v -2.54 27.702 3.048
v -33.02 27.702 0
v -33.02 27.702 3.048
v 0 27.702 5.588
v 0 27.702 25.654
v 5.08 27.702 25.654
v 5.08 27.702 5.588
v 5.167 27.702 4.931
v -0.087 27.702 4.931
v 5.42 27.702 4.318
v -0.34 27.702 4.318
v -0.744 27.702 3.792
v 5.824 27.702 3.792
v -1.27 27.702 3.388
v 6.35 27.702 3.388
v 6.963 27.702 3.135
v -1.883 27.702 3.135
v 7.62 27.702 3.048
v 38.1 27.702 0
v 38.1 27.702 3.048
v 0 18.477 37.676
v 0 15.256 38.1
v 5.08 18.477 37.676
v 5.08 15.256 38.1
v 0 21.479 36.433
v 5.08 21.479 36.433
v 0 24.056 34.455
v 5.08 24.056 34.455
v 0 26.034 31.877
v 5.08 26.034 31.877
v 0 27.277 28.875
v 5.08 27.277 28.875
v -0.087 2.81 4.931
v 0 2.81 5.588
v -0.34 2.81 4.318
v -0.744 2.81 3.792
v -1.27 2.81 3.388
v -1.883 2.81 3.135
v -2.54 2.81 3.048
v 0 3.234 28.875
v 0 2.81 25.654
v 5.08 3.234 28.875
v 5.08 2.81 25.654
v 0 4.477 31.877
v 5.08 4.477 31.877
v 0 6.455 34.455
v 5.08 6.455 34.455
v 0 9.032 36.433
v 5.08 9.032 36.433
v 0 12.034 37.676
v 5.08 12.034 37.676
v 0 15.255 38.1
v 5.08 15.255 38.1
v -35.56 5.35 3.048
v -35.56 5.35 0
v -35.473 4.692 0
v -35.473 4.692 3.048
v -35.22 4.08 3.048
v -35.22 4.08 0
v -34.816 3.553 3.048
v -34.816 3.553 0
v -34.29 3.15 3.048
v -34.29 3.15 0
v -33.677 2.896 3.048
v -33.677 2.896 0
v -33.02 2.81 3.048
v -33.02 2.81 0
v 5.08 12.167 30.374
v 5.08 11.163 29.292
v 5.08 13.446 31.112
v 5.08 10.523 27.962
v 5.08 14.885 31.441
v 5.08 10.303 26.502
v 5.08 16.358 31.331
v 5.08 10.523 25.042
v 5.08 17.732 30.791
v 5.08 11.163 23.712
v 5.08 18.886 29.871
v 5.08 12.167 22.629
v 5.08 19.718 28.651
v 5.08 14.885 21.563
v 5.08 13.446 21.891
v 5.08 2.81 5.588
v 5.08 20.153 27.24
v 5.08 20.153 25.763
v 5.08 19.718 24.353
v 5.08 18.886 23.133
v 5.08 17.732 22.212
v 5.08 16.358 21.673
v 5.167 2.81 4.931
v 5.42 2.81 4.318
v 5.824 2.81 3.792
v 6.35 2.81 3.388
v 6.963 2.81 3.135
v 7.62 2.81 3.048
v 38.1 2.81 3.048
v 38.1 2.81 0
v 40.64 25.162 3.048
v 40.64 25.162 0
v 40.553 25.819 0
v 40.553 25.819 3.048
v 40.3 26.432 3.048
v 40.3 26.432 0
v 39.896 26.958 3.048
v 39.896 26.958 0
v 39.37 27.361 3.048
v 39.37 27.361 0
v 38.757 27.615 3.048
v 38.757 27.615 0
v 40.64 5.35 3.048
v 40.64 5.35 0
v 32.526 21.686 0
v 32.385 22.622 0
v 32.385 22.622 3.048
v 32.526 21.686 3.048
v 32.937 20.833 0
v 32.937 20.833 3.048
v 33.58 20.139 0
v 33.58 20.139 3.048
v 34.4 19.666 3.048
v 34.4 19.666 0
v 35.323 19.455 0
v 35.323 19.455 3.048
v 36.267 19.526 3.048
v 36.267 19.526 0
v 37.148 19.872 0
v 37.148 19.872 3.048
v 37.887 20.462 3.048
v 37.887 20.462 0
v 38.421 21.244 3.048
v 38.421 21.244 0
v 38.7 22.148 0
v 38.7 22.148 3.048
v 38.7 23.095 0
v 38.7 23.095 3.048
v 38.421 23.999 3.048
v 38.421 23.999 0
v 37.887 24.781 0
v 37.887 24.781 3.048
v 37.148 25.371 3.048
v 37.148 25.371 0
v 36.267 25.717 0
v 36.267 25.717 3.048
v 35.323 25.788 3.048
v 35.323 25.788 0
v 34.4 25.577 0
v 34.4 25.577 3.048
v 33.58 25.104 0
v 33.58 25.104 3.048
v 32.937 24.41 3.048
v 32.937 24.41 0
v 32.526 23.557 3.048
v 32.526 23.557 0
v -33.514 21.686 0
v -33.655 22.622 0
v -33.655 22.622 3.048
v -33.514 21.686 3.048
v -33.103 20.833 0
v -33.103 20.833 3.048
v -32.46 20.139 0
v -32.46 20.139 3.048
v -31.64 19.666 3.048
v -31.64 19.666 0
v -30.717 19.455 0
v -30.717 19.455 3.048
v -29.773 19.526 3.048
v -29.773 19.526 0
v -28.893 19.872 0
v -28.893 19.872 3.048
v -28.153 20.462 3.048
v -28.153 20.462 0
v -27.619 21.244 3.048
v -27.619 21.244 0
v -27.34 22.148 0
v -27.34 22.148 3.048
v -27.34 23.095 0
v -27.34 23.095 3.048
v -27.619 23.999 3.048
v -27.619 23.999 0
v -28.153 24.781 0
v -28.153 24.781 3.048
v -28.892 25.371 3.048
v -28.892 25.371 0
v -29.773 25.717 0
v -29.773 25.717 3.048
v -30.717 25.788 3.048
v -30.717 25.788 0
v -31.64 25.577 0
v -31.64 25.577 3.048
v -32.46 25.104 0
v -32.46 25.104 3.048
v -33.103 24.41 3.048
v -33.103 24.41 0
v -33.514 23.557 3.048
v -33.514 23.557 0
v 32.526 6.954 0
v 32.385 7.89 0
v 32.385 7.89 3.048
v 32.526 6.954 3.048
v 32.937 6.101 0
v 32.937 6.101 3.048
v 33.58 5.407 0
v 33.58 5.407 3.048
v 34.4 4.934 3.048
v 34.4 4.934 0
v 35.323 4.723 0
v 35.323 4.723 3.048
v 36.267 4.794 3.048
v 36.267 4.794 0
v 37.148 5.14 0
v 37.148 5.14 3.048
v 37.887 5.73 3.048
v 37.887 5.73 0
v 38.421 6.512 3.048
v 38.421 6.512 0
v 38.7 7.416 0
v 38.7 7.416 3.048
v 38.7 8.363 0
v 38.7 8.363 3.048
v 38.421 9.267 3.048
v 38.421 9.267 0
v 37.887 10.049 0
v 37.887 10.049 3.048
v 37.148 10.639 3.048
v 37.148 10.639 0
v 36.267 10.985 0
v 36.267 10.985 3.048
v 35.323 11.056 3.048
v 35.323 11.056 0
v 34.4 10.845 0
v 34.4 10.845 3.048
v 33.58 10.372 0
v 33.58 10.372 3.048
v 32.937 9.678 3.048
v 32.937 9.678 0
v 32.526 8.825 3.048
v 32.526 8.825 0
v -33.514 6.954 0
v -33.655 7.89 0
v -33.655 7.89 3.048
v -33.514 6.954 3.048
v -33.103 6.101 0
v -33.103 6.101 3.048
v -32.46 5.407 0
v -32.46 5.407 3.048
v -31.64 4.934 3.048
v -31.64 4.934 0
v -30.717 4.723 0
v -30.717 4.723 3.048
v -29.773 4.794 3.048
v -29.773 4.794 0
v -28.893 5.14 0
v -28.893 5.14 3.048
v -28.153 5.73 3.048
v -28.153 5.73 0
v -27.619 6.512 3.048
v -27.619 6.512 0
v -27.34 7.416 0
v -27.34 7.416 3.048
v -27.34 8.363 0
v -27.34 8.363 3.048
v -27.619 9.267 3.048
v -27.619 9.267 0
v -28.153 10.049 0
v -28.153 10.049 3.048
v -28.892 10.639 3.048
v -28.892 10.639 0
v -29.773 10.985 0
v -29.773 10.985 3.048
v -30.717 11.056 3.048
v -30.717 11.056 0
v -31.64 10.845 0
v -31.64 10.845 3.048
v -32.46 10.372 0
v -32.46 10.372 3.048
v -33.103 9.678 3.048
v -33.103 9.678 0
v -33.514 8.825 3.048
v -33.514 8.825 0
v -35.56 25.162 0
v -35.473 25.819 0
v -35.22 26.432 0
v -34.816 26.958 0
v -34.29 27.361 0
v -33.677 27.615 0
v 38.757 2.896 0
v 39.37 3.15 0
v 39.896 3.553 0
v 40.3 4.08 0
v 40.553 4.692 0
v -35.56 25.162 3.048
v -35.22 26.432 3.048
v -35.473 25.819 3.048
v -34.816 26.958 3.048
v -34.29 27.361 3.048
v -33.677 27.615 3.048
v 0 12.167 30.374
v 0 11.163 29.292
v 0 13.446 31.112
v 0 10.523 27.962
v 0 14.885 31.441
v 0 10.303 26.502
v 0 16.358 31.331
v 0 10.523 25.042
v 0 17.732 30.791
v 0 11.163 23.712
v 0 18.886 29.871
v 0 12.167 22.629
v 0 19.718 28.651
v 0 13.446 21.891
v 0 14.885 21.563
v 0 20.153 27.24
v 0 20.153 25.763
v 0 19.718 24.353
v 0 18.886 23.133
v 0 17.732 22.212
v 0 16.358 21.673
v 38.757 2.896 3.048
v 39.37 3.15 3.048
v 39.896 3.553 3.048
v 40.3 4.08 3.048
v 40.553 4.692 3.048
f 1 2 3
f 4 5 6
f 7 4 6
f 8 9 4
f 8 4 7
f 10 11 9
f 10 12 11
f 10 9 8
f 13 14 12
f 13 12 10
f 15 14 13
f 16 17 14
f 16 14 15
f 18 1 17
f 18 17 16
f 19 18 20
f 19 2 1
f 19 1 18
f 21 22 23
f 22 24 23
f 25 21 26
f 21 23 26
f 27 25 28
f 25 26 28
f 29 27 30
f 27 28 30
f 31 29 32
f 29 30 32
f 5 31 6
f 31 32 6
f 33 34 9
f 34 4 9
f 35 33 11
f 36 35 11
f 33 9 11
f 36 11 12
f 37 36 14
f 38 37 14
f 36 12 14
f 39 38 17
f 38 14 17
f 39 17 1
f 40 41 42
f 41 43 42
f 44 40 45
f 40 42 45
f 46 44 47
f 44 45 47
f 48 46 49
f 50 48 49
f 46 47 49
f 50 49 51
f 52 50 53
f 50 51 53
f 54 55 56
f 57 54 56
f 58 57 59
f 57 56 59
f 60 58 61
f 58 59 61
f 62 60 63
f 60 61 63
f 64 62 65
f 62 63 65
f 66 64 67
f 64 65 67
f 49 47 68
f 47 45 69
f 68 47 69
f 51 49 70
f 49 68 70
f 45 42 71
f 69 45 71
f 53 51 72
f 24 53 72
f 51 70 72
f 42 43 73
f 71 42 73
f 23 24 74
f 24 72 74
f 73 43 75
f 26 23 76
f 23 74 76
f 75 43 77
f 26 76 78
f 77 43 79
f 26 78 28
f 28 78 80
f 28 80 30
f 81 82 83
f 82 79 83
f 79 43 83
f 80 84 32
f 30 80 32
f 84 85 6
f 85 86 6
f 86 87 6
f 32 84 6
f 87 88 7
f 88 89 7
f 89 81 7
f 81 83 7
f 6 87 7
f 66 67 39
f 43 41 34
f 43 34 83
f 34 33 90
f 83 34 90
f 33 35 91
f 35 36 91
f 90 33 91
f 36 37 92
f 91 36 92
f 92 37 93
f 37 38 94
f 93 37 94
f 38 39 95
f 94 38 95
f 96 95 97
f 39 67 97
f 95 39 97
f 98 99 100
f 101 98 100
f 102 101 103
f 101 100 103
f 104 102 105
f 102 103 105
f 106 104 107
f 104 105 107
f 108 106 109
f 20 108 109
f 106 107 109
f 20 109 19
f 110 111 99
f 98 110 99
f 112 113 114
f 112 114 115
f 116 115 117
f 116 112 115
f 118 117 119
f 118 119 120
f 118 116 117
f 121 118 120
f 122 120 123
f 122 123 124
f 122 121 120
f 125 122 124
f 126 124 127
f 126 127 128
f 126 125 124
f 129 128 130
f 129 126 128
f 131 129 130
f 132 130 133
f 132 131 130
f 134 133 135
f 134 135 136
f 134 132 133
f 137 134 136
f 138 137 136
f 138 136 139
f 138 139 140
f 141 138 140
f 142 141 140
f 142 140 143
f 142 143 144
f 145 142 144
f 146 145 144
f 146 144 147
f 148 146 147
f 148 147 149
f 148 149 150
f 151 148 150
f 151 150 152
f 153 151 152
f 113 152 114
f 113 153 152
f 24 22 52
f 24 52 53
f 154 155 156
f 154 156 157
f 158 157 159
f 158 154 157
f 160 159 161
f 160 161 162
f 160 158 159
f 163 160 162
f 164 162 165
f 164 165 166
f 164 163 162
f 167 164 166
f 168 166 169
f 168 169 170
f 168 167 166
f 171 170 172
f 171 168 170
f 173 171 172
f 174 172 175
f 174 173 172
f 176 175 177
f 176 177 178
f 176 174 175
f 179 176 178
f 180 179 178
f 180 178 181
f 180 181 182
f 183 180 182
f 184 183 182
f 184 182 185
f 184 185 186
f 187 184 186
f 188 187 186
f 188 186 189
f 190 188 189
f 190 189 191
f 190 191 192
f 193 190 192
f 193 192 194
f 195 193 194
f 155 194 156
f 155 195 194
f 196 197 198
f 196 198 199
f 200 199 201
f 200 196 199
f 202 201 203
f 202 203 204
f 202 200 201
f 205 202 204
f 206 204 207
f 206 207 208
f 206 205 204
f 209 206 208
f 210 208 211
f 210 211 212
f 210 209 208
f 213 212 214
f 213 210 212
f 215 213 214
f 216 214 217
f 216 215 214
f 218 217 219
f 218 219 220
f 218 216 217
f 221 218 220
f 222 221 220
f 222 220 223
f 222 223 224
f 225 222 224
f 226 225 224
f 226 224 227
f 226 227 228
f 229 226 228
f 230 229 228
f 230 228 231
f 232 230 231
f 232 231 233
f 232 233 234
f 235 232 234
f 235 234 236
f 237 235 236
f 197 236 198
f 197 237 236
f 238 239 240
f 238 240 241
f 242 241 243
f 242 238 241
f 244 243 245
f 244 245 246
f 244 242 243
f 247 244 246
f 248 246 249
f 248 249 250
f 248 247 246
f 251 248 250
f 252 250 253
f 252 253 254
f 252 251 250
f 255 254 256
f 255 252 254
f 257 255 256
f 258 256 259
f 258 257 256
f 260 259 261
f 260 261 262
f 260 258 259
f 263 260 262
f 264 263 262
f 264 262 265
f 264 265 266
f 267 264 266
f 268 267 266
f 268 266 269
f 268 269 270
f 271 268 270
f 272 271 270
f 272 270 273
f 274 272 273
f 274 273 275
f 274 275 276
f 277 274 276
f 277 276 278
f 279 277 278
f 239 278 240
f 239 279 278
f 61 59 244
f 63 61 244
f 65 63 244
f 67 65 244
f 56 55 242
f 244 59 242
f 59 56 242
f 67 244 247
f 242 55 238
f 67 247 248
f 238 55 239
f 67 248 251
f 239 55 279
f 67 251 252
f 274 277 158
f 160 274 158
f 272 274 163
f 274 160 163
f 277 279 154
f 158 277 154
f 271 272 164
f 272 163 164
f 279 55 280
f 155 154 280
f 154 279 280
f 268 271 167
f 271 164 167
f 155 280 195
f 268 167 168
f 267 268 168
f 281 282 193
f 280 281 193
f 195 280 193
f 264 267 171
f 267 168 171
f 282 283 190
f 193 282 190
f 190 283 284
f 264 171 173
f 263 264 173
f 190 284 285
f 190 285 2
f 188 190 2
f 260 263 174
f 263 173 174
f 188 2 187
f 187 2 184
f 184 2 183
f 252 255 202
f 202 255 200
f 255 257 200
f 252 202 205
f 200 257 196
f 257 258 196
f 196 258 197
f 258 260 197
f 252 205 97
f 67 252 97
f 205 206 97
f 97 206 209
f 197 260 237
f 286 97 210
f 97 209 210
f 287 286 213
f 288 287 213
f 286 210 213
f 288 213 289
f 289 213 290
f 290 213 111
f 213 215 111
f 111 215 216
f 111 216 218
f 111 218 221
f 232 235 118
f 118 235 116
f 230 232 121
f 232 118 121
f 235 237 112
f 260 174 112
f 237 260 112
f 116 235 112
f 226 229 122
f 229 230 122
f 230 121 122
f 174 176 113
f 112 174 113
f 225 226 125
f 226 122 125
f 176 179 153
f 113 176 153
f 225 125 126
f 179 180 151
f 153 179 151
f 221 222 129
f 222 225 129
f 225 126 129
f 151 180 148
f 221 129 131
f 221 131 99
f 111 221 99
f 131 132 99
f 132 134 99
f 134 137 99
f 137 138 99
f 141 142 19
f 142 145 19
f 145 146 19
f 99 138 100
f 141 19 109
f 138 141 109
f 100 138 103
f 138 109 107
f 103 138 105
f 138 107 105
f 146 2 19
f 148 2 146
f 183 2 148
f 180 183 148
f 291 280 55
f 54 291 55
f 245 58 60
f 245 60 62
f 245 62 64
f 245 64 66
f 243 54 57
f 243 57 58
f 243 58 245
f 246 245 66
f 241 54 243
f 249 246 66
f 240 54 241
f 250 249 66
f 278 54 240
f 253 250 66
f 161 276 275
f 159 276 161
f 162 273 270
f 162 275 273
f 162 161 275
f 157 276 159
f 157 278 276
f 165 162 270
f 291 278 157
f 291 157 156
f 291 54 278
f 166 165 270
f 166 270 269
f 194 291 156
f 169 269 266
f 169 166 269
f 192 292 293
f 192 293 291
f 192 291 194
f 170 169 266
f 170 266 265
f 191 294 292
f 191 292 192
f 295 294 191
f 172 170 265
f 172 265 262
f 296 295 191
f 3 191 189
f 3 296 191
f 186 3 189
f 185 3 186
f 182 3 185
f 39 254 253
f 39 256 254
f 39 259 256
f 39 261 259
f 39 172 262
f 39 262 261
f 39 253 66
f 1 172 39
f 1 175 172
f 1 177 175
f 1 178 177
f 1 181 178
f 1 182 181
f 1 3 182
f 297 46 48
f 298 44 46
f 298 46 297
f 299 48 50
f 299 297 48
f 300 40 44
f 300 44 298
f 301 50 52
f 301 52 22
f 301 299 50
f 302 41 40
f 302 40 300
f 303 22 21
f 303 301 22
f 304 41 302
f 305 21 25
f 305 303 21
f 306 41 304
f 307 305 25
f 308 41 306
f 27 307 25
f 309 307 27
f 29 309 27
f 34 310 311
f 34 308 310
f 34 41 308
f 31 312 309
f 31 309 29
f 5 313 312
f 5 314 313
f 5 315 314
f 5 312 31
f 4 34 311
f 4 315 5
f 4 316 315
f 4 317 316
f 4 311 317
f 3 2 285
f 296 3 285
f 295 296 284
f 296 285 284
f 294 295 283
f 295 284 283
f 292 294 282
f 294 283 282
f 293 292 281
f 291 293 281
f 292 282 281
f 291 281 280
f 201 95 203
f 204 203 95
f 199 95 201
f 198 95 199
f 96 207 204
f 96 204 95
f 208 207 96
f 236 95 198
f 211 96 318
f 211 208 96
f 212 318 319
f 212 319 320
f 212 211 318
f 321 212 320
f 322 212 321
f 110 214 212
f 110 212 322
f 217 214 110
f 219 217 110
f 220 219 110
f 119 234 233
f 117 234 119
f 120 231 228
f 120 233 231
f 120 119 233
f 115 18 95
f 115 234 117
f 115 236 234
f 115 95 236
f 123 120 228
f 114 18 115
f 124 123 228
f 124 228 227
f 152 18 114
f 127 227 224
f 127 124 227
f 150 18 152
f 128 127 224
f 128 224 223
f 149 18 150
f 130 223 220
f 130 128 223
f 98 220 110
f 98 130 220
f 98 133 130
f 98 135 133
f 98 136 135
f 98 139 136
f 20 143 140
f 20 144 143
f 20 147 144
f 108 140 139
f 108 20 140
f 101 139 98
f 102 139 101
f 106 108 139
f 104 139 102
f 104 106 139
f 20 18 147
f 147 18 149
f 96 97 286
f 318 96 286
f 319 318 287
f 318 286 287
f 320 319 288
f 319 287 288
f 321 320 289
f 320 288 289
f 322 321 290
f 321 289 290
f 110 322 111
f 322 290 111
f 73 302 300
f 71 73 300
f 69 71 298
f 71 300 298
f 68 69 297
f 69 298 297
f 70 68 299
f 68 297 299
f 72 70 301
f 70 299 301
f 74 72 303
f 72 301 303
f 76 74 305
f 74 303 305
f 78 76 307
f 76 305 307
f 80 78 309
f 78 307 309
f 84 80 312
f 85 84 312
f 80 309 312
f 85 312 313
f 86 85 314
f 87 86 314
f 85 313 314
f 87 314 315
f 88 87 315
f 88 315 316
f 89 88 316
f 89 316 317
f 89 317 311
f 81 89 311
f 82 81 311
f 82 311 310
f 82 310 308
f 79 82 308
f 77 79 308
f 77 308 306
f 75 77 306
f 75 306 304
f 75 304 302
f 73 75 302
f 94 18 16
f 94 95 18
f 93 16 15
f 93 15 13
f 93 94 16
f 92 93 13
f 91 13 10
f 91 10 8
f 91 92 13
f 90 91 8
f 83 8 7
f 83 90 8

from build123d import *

# Parameters (mm, degrees)
SKETCH1_R             = 3.175
BOSS_EXTRUDE9_DEPTH   = 3.048
BOSS_EXTRUDE9_2_DEPTH = 3.048
SKETCH1_17_W          = 5.08
SKETCH1_17_H          = 24.892
BOSS_EXTRUDE10_DEPTH  = 38.1
FILLET3_R             = 2.54
FILLET4_R             = 2.54
FILLET6_R             = 12.446
SKETCH2_R             = 4.953
CUT_EXTRUDE1_DEPTH    = 38.1


with BuildPart() as part:
    # Sketch1 → Boss-Extrude9 (new body)
    with BuildSketch(Plane.XY):
        with BuildLine():
            Line((0, 2.809544612), (0, 27.701544612))
            Line((0, 27.701544612), (-33.02, 27.701544612))
            ThreePointArc((-33.02, 27.701544612), (-34.816051224, 26.957595836), (-35.56, 25.161544612))
            Line((-35.56, 25.161544612), (-35.56, 5.349544612))
            ThreePointArc((-35.56, 5.349544612), (-34.816051224, 3.553493388), (-33.02, 2.809544612))
            Line((-33.02, 2.809544612), (0, 2.809544612))
        make_face()
        with Locations(Location((-30.48, 7.889544612, 0), (0, 0, 180))):
            Circle(SKETCH1_R, mode=Mode.SUBTRACT)
        with Locations(Location((-30.48, 22.621544612, 0), (0, 0, 180))):
            Circle(SKETCH1_R, mode=Mode.SUBTRACT)
    extrude(amount=BOSS_EXTRUDE9_DEPTH)



with BuildPart() as body_2:
    # Sketch1 → Boss-Extrude9 2 (new body)
    with BuildSketch(Plane.XY):
        with BuildLine():
            Line((38.1, 27.701544612), (5.08, 27.701544612))
            Line((5.08, 27.701544612), (5.08, 2.809544612))
            Line((5.08, 2.809544612), (38.1, 2.809544612))
            ThreePointArc((38.1, 2.809544612), (39.896051224, 3.553493388), (40.64, 5.349544612))
            Line((40.64, 5.349544612), (40.64, 25.161544612))
            ThreePointArc((40.64, 25.161544612), (39.896051224, 26.957595836), (38.1, 27.701544612))
        make_face()
        with Locations(Location((35.56, 7.889544612, 0), (0, 0, 180))):
            Circle(SKETCH1_R, mode=Mode.SUBTRACT)
        with Locations(Location((35.56, 22.621544612, 0), (0, 0, 180))):
            Circle(SKETCH1_R, mode=Mode.SUBTRACT)
    extrude(amount=BOSS_EXTRUDE9_2_DEPTH)


with BuildPart() as part_1:
    add(part.part)

    add(body_2.part)  # Boss-Extrude10 merges body 2
    # Sketch1<17> → Boss-Extrude10 (add)
    with BuildSketch(Plane.XY):
        with Locations((2.54, 15.255544612)):
            Rectangle(SKETCH1_17_W, SKETCH1_17_H)
    extrude(amount=BOSS_EXTRUDE10_DEPTH)

    # Fillet3
    fillet3_edges = [part_1.edges().sort_by_distance(p)[0] for p in [
        (5.08, 15.255544612, 3.048),
    ]]
    fillet(fillet3_edges, radius=FILLET3_R)

    # Fillet4
    fillet4_edges = [part_1.edges().sort_by_distance(p)[0] for p in [
        (0, 15.255544612, 3.048),
    ]]
    fillet(fillet4_edges, radius=FILLET4_R)

    # Fillet6
    fillet6_edges = [part_1.edges().sort_by_distance(p)[0] for p in [
        (2.54, 2.809544612, 38.1),
        (2.54, 27.701544612, 38.1),
    ]]
    fillet(fillet6_edges, radius=FILLET6_R - 0.0001)  # a hair under: the kernel refuses the full size

    # Sketch2 → Cut-Extrude1 (cut)
    with BuildSketch(Plane.ZY):
        with Locations(Location((26.501688995, 15.255544612, 0), (0, 0, 270))):
            Circle(SKETCH2_R)
    extrude(amount=-CUT_EXTRUDE1_DEPTH, mode=Mode.SUBTRACT)


solid = part_1.part
